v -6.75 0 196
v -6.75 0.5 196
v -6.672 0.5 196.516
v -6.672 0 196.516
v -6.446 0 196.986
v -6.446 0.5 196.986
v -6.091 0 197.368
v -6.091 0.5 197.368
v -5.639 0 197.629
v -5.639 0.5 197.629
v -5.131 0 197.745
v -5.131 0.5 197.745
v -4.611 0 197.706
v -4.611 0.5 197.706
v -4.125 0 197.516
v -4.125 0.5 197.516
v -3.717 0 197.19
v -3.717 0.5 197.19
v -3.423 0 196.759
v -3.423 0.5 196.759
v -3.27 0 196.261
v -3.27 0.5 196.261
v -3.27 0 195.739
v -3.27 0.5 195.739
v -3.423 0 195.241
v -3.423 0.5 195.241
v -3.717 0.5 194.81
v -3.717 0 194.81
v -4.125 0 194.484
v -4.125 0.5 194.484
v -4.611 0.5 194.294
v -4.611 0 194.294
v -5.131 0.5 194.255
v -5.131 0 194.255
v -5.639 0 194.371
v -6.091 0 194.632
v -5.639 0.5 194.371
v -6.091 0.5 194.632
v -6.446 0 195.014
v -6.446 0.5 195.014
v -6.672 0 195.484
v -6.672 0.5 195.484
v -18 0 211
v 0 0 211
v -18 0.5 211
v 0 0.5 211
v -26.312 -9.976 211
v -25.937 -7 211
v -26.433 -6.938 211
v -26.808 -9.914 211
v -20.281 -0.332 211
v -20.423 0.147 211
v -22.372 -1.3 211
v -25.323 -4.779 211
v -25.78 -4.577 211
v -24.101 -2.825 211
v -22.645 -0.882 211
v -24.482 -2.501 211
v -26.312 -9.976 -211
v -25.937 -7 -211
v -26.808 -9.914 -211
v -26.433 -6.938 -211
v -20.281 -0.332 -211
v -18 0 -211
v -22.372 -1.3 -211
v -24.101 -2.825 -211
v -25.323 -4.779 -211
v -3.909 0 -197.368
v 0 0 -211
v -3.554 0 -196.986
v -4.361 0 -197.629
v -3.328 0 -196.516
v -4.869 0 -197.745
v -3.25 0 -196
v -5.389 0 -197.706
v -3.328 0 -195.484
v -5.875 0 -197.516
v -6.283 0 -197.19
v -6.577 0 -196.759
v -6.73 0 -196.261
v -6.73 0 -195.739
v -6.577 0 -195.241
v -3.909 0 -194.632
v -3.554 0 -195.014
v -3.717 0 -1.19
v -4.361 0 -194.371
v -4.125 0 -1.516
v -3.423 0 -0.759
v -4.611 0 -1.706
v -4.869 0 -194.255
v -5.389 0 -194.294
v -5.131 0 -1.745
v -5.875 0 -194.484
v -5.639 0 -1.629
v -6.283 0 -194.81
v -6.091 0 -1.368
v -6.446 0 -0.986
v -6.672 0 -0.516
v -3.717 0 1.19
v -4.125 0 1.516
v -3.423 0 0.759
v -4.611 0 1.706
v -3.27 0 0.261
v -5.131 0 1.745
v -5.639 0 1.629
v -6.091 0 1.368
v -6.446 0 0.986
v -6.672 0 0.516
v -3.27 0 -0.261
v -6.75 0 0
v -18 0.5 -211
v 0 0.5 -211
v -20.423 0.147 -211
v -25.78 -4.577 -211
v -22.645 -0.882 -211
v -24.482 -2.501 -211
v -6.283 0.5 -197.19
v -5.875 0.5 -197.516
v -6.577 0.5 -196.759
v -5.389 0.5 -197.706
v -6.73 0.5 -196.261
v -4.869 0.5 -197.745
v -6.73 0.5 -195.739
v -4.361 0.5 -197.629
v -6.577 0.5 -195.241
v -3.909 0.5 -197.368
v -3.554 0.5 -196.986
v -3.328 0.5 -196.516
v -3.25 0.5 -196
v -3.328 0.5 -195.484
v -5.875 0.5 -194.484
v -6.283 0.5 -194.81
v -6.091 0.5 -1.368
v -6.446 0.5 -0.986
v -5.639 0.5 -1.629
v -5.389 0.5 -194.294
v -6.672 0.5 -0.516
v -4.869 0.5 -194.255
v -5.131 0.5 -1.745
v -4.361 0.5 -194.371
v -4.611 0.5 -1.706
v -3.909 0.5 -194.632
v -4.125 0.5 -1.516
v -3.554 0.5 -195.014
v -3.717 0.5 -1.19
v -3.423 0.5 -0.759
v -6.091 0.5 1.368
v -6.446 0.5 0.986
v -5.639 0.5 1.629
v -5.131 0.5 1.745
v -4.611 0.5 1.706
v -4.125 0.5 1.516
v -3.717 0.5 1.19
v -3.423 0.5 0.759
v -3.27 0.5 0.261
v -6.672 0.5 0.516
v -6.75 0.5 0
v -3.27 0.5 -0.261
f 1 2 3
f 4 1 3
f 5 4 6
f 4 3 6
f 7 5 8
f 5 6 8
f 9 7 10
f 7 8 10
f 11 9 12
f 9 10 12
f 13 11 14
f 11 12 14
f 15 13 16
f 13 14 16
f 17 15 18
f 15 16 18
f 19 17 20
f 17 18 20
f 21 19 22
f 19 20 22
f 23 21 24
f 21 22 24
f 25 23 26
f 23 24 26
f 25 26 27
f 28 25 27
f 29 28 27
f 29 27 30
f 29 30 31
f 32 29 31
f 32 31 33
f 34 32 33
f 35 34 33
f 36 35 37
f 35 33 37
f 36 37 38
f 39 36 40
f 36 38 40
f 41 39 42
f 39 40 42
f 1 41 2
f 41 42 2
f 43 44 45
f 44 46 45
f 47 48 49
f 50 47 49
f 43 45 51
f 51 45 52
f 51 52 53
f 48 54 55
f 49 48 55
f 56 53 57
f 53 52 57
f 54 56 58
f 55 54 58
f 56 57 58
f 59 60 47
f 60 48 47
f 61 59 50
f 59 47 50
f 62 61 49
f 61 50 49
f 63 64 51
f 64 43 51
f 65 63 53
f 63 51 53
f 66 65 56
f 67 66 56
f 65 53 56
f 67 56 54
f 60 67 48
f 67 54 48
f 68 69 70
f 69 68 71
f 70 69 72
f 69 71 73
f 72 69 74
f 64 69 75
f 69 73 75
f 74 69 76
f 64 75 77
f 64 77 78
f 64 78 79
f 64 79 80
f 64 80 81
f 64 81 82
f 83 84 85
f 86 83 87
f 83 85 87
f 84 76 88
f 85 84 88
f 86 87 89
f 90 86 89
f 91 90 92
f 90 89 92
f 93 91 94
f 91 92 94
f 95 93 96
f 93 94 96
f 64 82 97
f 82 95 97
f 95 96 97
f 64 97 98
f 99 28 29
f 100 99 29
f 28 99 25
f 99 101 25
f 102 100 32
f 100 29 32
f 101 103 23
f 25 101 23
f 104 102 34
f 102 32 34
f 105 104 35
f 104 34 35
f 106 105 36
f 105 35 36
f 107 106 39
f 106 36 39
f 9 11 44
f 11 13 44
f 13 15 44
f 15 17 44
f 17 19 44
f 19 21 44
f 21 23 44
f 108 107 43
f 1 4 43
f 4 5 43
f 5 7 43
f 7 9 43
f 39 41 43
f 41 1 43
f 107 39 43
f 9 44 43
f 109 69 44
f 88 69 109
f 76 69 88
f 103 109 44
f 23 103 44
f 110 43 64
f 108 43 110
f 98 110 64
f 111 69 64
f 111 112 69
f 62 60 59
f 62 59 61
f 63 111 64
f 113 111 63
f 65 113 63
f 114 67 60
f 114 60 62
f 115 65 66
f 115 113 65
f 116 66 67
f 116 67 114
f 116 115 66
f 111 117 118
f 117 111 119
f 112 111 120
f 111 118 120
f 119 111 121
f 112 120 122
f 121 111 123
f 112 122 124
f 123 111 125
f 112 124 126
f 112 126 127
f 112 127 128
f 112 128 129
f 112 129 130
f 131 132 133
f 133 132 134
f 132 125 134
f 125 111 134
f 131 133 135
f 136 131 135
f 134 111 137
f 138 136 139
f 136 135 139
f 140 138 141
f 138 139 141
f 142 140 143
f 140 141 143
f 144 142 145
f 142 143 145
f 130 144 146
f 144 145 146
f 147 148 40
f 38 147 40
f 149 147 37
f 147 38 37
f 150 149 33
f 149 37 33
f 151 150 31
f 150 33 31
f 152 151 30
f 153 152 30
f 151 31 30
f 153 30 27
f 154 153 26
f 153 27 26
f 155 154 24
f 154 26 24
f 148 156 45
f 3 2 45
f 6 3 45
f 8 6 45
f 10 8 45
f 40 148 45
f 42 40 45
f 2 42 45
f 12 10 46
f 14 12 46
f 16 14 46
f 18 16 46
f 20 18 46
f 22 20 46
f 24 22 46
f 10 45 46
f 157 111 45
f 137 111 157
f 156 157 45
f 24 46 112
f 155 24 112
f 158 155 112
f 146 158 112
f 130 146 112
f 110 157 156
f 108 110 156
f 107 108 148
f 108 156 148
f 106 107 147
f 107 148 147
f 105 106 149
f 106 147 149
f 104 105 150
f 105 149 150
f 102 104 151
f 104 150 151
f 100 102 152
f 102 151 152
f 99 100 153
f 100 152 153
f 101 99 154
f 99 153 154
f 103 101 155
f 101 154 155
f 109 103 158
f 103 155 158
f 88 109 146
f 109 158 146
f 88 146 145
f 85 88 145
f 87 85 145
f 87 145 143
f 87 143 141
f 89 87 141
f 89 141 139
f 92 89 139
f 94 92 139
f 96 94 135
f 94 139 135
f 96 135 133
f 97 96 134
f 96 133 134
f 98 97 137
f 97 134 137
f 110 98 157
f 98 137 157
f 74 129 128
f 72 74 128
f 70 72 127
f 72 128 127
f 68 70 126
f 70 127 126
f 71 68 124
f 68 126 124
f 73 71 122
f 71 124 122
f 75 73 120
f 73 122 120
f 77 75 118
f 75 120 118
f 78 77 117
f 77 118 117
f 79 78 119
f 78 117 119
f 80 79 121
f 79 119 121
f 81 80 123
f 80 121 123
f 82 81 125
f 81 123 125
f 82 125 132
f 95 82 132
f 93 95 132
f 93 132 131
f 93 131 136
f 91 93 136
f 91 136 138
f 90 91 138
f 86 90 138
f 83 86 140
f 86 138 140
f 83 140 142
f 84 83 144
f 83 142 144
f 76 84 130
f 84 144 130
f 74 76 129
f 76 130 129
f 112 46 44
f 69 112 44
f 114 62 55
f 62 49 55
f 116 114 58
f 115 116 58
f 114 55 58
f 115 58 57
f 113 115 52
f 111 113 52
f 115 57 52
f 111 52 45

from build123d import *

# Parameters (mm, degrees)
BASE_FLANGE1_DEPTH = 211
SKETCH2_R          = 1.75
EXTRUDE1_DEPTH     = 0.5


# Sheet-metal steps are written as plain solids
with BuildPart() as part:
    # Sketch1 → Base-Flange1 (new, symmetric)
    with BuildSketch(Plane.XY):
        with BuildLine():
            Line((0, 0), (-18, 0))
            ThreePointArc((-18, 0), (-23.291502622, -2), (-25.937253933, -7))
            Line((-25.937253933, -7), (-26.312253933, -9.976470225))
            Line((-26.312253933, -9.976470225), (-26.808332304, -9.913970225))
            Line((-26.808332304, -9.913970225), (-26.433332304, -6.9375))
            ThreePointArc((-26.433332304, -6.9375), (-23.622221536, -1.625), (-18, 0.5))
            Line((-18, 0.5), (0, 0.5))
            Line((0, 0.5), (0, 0))
        make_face()
    extrude(amount=BASE_FLANGE1_DEPTH, both=True)

    # Sketch2 → Extrude1 (cut)
    with BuildSketch(Plane(origin=(0, 0.5, 0), x_dir=(1, 0, 0), z_dir=(0, 1, 0))):
        with Locations(Location((-5, -196, 0), (0, 0, 180))):
            Circle(SKETCH2_R)
        with Locations((-5, 196)):
            Circle(SKETCH2_R)
        with Locations(Location((-5, 0, 0), (0, 0, 180))):
            Circle(SKETCH2_R)
    extrude(amount=-EXTRUDE1_DEPTH, mode=Mode.SUBTRACT)


solid = part.part
